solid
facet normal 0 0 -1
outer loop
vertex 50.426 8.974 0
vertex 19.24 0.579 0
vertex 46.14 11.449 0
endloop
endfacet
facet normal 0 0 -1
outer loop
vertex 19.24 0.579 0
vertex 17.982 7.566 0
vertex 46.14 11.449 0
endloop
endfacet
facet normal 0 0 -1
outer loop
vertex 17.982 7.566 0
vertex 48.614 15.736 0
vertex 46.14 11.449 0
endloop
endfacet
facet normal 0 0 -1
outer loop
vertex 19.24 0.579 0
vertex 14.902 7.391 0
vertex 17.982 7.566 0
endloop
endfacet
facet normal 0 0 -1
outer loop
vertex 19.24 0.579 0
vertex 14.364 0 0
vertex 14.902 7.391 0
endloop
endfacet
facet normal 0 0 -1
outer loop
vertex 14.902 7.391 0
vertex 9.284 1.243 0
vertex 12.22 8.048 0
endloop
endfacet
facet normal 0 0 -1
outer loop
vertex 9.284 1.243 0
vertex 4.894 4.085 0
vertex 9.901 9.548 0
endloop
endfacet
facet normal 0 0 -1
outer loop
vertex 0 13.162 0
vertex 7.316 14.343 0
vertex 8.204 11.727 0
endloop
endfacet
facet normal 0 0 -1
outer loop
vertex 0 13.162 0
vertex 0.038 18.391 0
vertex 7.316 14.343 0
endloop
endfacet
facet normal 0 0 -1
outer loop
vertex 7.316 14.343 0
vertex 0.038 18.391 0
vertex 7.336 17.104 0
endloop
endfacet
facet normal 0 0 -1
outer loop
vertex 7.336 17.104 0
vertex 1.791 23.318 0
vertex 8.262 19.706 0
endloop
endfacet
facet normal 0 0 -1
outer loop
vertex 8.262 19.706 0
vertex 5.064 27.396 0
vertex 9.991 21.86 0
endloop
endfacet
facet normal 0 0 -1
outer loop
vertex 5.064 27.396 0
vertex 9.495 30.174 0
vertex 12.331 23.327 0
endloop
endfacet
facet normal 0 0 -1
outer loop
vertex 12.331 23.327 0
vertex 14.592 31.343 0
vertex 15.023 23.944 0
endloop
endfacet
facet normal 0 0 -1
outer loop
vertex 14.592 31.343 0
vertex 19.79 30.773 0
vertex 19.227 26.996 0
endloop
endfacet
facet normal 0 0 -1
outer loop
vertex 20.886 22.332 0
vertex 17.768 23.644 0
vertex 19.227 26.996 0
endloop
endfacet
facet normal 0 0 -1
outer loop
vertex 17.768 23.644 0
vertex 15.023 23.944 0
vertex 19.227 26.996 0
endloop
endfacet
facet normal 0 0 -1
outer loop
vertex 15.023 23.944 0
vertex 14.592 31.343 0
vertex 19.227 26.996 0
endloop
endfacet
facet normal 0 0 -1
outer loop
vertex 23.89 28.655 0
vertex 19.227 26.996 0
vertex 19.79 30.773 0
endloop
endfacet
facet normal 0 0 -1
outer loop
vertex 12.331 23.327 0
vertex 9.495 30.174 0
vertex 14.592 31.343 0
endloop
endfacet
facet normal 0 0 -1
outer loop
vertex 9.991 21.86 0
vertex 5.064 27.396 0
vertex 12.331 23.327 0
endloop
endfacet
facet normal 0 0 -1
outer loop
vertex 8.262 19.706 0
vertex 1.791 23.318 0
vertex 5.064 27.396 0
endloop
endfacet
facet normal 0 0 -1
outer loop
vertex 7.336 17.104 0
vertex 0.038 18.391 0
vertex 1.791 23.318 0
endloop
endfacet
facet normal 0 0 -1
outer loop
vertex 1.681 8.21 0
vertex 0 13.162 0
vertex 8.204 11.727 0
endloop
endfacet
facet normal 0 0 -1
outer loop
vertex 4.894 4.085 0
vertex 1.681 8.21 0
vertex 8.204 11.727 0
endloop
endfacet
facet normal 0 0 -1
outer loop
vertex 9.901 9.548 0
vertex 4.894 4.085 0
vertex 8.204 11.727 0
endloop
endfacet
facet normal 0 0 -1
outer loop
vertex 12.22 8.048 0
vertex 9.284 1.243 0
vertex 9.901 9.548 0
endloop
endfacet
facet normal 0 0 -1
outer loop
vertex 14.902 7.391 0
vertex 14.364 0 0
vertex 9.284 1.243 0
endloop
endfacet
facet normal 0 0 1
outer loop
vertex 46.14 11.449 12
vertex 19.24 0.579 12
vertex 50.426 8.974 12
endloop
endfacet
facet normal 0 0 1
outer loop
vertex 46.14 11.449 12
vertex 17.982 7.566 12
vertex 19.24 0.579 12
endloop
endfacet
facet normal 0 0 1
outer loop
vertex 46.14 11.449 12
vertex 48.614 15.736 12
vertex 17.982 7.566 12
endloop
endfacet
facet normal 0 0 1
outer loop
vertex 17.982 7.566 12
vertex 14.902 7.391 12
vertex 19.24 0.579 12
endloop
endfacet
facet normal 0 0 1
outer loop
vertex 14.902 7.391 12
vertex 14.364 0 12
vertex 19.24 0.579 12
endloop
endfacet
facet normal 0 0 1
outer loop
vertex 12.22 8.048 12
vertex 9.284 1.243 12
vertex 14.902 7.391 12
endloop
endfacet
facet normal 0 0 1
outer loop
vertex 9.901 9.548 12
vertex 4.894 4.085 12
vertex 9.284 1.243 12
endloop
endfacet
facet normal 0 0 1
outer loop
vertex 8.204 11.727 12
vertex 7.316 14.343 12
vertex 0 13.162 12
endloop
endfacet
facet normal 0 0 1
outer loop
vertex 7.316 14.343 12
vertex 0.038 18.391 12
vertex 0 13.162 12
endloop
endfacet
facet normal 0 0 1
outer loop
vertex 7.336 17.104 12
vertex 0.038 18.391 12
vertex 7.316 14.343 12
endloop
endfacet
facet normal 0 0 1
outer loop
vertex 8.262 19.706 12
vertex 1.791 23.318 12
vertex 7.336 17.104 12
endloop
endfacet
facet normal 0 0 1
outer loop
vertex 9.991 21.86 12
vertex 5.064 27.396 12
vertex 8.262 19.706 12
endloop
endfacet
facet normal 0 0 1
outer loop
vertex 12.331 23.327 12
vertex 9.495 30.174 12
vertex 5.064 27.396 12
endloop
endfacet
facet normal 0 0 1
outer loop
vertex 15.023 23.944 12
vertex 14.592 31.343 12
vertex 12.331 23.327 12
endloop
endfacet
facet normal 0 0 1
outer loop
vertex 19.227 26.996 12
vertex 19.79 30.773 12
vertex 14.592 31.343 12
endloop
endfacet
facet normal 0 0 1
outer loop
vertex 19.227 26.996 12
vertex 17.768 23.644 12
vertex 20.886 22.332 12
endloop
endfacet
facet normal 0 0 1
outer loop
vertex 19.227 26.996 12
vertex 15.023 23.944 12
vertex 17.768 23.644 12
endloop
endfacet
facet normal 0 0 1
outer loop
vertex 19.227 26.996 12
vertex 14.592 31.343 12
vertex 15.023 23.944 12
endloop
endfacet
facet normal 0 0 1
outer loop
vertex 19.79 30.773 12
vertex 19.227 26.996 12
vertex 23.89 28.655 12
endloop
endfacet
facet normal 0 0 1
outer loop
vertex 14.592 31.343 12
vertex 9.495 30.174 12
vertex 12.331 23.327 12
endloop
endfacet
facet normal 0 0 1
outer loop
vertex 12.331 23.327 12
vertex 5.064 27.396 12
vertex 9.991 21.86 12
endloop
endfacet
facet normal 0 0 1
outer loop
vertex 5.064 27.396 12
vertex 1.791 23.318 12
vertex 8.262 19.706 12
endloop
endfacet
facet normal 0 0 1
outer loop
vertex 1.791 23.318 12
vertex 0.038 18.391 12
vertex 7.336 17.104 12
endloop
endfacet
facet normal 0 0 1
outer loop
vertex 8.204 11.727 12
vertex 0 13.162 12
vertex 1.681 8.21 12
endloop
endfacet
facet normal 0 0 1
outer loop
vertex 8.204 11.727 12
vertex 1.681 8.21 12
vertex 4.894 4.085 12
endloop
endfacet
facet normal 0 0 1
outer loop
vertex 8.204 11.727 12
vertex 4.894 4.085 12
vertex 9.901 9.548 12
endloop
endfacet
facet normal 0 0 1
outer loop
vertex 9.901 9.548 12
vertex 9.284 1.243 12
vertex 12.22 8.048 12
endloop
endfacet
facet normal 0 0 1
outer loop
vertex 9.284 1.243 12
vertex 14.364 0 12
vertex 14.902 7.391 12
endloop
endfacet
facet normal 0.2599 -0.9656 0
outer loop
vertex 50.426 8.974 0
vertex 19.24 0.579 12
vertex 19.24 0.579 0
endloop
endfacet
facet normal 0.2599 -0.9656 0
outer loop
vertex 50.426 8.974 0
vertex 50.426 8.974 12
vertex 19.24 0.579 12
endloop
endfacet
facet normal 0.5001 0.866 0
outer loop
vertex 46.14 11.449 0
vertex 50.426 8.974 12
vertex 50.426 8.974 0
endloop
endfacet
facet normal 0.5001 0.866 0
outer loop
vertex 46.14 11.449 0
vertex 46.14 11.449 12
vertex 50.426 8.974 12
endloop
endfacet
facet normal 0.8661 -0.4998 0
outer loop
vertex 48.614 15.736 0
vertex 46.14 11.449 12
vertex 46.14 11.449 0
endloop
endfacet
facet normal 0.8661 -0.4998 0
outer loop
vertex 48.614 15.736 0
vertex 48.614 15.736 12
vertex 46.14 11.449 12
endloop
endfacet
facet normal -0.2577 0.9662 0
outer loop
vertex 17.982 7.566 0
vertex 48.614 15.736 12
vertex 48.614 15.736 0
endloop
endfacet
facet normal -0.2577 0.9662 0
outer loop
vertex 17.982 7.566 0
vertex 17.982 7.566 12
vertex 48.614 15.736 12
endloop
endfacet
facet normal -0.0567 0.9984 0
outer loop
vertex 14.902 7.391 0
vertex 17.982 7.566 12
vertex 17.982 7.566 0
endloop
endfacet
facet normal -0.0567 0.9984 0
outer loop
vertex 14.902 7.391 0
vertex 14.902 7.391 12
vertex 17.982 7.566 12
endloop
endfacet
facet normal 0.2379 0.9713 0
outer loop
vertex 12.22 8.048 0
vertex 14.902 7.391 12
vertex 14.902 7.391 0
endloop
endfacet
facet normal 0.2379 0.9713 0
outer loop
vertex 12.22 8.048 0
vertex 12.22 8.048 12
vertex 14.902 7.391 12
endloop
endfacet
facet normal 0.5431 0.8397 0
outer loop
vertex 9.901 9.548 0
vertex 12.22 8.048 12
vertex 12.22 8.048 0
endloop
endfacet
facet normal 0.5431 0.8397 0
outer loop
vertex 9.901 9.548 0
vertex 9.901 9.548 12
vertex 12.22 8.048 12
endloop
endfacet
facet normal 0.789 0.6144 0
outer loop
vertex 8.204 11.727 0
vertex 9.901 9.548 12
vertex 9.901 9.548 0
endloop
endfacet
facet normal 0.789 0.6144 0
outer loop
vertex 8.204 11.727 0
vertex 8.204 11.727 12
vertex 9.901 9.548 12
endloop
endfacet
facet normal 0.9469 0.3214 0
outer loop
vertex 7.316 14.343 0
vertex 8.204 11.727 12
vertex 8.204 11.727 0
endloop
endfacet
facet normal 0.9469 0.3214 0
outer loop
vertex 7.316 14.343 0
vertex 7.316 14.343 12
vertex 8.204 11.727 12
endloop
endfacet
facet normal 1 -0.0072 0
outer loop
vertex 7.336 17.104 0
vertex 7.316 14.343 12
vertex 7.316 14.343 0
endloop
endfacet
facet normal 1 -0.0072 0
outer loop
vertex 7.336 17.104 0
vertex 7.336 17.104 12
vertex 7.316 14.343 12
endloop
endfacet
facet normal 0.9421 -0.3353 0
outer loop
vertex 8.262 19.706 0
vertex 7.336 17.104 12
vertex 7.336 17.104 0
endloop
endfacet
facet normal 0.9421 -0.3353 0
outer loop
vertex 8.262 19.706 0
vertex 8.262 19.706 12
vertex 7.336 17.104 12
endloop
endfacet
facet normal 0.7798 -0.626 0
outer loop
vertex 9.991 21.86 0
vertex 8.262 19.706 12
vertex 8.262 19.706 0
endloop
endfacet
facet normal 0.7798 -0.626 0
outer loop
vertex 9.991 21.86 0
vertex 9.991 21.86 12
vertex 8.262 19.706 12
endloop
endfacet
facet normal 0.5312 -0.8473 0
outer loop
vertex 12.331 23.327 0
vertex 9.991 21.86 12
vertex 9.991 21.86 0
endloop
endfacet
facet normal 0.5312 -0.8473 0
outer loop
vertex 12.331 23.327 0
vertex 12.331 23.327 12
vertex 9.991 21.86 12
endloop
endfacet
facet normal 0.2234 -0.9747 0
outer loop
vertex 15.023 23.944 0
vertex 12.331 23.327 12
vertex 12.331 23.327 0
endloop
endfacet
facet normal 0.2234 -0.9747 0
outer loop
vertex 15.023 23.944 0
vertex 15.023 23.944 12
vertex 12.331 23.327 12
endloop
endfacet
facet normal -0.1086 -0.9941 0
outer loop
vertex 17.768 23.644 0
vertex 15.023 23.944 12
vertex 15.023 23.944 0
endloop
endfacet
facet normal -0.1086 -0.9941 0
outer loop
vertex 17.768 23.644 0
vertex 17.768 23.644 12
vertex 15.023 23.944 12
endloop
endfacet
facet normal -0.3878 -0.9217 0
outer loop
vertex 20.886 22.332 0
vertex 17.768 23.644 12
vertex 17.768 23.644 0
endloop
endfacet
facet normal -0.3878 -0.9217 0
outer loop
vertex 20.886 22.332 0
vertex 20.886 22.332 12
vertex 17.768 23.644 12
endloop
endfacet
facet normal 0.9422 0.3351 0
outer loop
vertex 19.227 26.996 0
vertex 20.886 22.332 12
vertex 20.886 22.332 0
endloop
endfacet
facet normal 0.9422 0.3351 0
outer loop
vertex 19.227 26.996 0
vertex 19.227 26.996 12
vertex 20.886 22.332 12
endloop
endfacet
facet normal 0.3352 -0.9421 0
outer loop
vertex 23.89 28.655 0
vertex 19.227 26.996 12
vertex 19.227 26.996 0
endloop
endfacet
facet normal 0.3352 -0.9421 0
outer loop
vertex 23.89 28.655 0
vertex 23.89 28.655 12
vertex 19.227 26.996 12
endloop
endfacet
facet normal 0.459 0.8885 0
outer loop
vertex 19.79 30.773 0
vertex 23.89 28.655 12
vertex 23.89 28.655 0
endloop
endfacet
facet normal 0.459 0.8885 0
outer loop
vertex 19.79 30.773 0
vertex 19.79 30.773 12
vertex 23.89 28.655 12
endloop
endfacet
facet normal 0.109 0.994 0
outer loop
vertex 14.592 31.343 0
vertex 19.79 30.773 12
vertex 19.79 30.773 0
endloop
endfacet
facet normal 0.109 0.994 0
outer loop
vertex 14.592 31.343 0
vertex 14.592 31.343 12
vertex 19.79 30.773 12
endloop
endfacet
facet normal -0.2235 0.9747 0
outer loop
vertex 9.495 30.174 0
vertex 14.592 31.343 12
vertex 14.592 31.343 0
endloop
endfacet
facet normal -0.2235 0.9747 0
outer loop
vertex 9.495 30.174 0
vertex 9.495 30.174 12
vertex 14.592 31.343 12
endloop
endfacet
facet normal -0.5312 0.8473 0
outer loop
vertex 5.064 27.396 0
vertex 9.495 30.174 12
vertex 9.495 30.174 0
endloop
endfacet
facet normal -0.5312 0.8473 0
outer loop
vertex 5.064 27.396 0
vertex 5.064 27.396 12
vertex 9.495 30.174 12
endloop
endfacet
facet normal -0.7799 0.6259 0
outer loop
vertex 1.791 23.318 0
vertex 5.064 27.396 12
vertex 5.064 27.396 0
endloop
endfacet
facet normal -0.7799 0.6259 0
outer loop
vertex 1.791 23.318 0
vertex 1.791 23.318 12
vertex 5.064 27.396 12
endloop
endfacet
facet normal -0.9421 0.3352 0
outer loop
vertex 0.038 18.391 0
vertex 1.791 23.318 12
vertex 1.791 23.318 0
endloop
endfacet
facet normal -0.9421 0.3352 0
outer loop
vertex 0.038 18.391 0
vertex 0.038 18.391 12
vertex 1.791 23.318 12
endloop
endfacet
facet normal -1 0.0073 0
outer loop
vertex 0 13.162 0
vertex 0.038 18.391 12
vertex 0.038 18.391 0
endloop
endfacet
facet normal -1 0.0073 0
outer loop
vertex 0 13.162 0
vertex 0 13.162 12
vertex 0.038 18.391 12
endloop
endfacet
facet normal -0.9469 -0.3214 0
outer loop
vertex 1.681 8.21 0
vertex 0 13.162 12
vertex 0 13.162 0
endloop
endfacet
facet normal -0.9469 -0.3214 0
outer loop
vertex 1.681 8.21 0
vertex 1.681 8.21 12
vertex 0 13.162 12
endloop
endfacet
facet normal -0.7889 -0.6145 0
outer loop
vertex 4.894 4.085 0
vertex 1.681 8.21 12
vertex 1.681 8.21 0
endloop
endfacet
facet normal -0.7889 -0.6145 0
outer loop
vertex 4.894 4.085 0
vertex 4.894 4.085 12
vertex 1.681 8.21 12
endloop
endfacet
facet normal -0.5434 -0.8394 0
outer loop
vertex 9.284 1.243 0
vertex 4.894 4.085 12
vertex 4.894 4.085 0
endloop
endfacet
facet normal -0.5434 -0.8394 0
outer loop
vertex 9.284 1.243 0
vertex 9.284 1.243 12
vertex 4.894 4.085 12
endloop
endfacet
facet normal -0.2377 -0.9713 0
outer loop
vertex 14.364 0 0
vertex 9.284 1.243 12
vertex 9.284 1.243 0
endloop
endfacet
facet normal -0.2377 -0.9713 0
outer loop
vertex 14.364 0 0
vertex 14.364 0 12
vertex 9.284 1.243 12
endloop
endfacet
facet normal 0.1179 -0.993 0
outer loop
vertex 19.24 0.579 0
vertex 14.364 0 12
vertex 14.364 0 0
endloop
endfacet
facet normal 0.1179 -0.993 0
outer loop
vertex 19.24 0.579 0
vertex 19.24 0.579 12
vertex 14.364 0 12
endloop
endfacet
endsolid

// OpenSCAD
$fn = 32;

// ----------------------------------------------------------------------
// Eye lug: ring_tail, 12 mm thick
// ----------------------------------------------------------------------

// --- parameters (mm) ---
profile_height = 12;      // extrusion height
profile_points = 30;      // points of the closed outline

profile = [[19.227, 26.996], [23.89, 28.655], [19.79, 30.773], [14.592, 31.343], [9.495, 30.174], [5.064, 27.396], [1.791, 23.318], [0.038, 18.391], [0, 13.162], [1.681, 8.21], [4.894, 4.085], [9.284, 1.243], [14.364, 0], [19.24, 0.579], [50.426, 8.974], [46.14, 11.449], [48.614, 15.736], [17.982, 7.566], [14.902, 7.391], [12.22, 8.048], [9.901, 9.548], [8.204, 11.727], [7.316, 14.343], [7.336, 17.104], [8.262, 19.706], [9.991, 21.86], [12.331, 23.327], [15.023, 23.944], [17.768, 23.644], [20.886, 22.332]];  // single closed polygon, 30 points, counter clockwise

// --- the one profile operation ---
linear_extrude(height = profile_height) polygon(points = profile);
